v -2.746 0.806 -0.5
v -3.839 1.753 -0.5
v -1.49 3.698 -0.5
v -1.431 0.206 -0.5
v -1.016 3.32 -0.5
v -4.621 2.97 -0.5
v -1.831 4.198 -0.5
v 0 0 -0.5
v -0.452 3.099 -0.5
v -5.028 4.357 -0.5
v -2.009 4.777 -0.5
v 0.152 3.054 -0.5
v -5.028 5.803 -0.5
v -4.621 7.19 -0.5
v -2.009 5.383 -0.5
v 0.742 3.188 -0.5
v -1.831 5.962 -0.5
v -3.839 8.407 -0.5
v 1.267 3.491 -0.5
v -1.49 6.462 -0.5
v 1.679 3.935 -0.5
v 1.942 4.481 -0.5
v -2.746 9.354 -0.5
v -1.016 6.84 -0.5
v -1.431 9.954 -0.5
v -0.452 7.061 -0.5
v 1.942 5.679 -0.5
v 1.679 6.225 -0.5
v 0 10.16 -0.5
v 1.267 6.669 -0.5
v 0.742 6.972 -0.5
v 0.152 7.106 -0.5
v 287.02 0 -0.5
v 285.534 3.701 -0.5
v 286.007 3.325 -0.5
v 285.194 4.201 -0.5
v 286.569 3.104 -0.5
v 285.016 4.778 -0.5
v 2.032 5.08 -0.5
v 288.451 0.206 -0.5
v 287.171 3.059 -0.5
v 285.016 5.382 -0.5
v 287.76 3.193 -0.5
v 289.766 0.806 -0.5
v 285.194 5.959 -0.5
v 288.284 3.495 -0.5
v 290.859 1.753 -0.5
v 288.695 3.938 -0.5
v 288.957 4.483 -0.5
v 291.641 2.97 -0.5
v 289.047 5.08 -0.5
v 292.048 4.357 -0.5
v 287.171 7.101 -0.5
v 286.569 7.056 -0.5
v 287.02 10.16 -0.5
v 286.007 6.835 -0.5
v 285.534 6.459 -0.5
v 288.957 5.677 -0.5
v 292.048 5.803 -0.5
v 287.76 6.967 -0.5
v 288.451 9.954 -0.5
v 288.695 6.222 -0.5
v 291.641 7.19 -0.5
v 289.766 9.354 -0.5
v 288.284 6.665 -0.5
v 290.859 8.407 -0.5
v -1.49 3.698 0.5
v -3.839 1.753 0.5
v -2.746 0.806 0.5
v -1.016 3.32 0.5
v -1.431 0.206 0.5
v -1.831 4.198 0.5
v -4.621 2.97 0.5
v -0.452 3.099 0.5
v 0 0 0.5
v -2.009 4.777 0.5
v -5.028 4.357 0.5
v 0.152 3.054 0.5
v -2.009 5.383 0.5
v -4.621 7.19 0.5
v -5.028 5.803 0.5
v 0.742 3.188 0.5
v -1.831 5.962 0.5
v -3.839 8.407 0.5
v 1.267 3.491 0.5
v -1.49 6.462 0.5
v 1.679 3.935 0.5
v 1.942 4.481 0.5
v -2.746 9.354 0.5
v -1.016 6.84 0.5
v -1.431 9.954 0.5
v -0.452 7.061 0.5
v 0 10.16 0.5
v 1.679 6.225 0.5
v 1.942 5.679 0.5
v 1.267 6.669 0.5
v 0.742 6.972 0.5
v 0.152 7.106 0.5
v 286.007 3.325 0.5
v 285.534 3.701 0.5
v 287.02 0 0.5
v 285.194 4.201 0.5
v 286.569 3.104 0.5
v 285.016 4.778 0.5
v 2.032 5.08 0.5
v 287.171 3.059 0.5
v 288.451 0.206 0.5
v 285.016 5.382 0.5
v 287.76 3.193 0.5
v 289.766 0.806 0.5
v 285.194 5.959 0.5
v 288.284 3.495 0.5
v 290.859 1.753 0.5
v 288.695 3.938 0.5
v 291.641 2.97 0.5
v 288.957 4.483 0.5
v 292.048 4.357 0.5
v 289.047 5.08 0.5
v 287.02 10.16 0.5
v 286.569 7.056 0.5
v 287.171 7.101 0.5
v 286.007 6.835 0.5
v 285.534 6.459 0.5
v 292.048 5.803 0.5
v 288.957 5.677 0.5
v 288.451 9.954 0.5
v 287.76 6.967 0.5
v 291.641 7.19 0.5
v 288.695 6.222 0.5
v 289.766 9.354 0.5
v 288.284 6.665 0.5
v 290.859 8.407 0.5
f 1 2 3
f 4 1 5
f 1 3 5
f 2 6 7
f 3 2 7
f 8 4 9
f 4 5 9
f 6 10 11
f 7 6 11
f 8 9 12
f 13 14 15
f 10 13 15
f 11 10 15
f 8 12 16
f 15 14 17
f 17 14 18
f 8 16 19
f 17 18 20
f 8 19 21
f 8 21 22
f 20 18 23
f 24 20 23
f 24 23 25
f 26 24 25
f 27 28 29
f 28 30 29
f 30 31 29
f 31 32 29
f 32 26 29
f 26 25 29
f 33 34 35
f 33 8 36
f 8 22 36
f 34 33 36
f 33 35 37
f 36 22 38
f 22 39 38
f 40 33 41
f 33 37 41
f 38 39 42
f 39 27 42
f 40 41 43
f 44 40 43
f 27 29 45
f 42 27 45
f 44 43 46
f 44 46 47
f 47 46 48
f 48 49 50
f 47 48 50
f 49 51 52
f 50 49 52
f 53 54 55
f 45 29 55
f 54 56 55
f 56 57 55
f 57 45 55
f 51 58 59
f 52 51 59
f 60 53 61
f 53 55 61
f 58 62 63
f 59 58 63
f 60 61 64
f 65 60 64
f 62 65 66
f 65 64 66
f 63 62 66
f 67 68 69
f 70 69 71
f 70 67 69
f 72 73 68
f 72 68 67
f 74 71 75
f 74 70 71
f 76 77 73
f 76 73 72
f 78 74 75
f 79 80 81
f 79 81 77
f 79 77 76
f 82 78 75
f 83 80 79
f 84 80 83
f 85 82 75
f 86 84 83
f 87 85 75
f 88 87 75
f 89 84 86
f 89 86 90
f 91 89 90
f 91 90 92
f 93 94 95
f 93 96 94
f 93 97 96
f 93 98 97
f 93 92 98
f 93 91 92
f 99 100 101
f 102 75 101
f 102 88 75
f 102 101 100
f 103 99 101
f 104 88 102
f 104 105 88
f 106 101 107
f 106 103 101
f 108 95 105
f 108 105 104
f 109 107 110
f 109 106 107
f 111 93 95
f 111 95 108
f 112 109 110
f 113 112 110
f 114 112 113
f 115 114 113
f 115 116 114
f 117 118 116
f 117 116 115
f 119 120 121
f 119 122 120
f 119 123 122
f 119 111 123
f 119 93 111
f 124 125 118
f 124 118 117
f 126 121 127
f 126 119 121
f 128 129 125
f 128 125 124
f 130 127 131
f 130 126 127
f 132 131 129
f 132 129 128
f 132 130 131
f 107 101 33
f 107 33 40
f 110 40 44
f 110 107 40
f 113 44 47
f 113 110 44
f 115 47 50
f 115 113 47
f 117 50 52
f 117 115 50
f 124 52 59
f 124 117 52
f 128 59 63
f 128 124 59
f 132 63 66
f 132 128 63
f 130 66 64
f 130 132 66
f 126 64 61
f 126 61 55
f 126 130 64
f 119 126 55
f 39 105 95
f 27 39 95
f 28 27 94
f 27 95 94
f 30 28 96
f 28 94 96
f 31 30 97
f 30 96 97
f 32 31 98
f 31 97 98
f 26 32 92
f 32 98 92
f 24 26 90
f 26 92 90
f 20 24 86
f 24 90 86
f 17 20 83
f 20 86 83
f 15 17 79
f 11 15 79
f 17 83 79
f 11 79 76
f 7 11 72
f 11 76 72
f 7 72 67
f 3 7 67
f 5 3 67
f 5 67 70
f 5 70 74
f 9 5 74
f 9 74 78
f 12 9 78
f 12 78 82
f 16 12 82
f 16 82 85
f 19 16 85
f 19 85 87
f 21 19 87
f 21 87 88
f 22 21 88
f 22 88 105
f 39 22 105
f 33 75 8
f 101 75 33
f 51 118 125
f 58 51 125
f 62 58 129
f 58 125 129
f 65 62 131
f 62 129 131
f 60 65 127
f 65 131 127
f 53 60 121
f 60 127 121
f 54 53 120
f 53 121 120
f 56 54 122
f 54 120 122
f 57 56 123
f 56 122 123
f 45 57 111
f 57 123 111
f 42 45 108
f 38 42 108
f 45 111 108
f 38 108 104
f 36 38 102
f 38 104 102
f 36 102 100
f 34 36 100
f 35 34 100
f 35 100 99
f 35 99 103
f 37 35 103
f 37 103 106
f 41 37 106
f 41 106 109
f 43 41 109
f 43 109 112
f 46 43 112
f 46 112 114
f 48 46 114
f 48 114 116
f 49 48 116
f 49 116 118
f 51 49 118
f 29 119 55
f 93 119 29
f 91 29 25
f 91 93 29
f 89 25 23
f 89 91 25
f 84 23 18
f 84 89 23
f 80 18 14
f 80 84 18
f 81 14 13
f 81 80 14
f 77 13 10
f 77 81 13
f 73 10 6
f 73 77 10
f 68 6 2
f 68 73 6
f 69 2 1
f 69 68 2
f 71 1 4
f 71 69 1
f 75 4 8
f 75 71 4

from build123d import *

# Parameters (mm, degrees)
BOSS_EXTRUDE1_DEPTH = 0.5
SKETCH2_R           = 2.032
SKETCH2_R_2         = 2.026725148
CUT_EXTRUDE1_DEPTH  = 2.54


with BuildPart() as part:
    # Sketch1 → Boss-Extrude1 (new, symmetric)
    with BuildSketch(Plane.XY):
        with BuildLine():
            Line((0, 0), (287.02, 0))
            ThreePointArc((287.02, 0), (292.1, 5.08), (287.02, 10.16))
            Line((287.02, 10.16), (0, 10.16))
            ThreePointArc((0, 10.16), (-5.08, 5.08), (0, 0))
        make_face()
    extrude(amount=BOSS_EXTRUDE1_DEPTH, both=True)

    # Sketch2 → Cut-Extrude1 (cut)
    with BuildSketch(Plane.XY.offset(0.5)):
        with Locations((0, 5.08)):
            Circle(SKETCH2_R)
        with Locations((287.02, 5.08)):
            Circle(SKETCH2_R_2)
    extrude(amount=-CUT_EXTRUDE1_DEPTH, mode=Mode.SUBTRACT)


solid = part.part
